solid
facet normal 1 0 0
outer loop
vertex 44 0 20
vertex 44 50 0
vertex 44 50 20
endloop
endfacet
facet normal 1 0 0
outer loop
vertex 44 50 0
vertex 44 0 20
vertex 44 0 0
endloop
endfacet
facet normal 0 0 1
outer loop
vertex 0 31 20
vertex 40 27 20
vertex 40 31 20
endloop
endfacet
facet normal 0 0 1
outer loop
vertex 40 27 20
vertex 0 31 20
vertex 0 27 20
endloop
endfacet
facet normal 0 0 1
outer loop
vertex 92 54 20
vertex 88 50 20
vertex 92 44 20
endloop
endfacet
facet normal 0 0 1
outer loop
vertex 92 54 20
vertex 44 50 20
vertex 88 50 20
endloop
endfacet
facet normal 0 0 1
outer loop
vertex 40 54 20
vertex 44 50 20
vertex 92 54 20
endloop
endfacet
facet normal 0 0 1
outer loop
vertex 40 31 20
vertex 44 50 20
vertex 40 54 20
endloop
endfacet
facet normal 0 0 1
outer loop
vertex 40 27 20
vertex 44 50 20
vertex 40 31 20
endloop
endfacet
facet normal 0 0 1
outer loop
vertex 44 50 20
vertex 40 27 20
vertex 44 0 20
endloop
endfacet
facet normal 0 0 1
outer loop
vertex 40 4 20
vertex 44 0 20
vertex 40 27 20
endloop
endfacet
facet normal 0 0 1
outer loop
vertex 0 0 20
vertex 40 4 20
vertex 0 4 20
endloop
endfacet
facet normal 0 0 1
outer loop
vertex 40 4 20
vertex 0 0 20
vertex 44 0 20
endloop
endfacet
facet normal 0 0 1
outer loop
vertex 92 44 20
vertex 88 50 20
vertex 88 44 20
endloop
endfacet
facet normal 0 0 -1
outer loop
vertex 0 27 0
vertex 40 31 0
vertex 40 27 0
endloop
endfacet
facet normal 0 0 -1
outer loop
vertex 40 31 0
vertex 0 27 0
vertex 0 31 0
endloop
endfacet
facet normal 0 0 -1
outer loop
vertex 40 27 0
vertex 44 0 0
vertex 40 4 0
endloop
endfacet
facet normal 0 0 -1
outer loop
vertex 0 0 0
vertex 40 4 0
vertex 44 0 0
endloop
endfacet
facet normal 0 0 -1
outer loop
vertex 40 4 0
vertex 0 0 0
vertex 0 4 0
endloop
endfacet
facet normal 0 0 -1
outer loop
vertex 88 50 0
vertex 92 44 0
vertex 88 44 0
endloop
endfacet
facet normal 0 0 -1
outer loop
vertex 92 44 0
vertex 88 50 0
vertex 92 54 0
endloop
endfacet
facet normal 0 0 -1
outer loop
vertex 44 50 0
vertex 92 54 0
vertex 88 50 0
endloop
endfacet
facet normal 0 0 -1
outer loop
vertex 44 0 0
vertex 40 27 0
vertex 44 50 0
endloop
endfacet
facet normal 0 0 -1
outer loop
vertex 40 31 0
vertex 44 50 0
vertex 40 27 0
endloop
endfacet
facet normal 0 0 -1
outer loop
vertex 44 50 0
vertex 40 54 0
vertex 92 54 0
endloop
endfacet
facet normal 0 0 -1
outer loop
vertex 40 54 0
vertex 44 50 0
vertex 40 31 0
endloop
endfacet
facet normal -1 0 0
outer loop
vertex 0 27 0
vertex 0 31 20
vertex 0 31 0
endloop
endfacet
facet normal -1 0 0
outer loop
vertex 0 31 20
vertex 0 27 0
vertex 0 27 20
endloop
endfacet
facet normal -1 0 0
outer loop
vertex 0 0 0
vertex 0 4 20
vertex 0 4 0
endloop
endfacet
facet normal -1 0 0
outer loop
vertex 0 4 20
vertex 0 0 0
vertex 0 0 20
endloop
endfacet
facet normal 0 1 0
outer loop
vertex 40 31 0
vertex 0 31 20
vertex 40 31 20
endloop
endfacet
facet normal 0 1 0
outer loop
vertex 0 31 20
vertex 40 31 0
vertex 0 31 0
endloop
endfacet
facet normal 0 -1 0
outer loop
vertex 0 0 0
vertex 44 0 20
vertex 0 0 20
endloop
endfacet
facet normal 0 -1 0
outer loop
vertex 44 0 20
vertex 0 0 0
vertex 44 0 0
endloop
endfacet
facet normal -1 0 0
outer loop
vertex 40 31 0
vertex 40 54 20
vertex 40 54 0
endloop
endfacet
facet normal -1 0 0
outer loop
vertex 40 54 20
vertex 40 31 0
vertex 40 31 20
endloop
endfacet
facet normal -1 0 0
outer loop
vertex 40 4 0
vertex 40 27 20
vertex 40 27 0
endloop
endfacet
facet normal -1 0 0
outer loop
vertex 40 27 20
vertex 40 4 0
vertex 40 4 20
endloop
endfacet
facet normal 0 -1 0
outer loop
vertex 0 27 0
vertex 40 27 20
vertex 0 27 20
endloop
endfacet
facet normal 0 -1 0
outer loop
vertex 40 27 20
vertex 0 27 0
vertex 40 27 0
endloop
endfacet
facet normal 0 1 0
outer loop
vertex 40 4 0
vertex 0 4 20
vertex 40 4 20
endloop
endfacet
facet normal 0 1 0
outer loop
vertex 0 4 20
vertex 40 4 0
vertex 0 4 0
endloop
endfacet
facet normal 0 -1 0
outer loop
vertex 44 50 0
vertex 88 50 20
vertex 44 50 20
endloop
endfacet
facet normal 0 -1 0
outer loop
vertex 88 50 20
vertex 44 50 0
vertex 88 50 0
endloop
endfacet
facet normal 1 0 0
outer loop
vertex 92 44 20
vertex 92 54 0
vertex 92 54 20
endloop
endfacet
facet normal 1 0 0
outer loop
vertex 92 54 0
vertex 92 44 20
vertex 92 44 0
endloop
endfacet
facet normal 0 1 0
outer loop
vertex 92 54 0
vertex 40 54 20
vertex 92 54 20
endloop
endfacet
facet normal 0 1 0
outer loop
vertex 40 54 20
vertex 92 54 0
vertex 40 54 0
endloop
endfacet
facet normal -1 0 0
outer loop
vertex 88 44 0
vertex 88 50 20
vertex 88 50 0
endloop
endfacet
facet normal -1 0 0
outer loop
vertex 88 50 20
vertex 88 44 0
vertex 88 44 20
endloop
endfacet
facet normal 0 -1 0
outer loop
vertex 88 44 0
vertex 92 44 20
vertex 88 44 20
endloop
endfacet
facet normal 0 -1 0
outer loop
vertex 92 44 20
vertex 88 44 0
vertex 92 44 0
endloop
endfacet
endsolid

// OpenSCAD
breite=20;
difference()
{
    cube([44,31,breite]);
    translate([-1,4,-1])
    {
        cube([41,23,breite+2]);
    }
}
translate([40,0,0])
{
    cube([4,50,breite]);
}

translate([40,50,0])
{
    cube([52,4,breite]);
}
translate([88,44,0])
{
    cube([4,8,breite]);
}
